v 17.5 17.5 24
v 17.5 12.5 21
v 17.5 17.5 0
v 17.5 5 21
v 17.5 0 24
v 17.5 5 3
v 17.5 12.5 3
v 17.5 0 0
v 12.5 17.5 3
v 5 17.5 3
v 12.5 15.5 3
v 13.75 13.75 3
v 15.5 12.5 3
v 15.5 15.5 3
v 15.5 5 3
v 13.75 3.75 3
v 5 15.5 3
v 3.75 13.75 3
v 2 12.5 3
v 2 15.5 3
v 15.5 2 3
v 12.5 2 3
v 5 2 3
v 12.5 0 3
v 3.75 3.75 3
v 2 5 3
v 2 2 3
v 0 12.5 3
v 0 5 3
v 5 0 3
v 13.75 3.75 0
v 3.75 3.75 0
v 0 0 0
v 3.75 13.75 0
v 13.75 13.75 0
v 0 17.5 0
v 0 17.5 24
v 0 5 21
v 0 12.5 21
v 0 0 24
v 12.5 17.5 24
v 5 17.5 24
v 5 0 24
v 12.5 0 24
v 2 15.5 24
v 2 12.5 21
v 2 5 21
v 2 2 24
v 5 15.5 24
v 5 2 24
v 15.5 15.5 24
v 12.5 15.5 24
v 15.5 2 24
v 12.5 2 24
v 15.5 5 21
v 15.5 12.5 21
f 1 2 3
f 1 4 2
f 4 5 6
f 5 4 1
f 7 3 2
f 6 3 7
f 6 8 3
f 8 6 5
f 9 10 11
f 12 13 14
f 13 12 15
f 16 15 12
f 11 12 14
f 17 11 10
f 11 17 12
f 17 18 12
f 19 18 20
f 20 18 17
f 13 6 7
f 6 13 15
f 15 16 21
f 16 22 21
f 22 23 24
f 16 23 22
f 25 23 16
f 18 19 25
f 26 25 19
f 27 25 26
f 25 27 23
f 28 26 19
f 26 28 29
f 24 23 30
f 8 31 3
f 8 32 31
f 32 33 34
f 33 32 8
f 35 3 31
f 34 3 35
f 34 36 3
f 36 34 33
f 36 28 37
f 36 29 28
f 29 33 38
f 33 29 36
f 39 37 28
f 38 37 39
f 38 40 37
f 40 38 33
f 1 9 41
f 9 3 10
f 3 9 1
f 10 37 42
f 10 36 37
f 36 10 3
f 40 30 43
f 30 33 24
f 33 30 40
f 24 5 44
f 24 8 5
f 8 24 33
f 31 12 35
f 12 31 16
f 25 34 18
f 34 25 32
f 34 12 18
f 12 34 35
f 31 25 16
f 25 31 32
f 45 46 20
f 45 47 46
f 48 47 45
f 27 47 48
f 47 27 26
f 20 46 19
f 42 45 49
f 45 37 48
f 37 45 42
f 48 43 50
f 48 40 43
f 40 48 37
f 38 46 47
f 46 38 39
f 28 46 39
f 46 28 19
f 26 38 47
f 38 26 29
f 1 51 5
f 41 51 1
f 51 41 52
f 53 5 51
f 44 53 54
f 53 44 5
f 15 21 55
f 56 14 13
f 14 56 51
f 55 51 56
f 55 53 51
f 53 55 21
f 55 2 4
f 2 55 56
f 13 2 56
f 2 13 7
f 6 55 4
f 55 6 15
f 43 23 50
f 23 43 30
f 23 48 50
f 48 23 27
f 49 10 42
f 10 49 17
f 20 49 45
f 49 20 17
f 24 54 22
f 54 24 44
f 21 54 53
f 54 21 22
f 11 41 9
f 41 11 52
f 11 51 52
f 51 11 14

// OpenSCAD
// Cuvette Holder
// 8/19/15
// Justin Chew
// Rust Lab
// measurements are in mm

//cuvette_width = 12;
//cuvette_height = 45;

// Length (number of holders)
long = 1;
// Width (number of holders)
wide = 1;
support_height = 24*1;
support_length = 5*1;
support_thick = 2*1;
base_inner_hole = 10*1;
base_int_hole = 13.5*1;
base_ext = base_int_hole+2*support_thick;
base_thick = 3*1;

for (i = [0:long-1]) {
for (j = [0:wide-1]) {

translate([i*(base_ext-support_thick),j*(base_ext-support_thick),0]) {

// base of support
difference() {
    
    cube([base_ext, base_ext, base_thick]);
    
    translate([(base_ext-base_inner_hole)/2, (base_ext-base_inner_hole)/2, 0]) {
        cube([base_inner_hole, base_inner_hole, base_thick]);
    }

}

// side wall supports
for (k = [0:1]) {
translate([k*(base_ext-support_thick),0,0]) {
difference() {
cube([support_thick, base_ext, support_height]);
translate([0, support_length, base_thick]) {
cube([support_thick, base_ext-2*support_length, support_height-2*base_thick]);
}
}
}
}
// start four-corner supports
// bottom left corner
cube([support_length, support_thick, support_height]);
// top left corner
translate([0, base_ext-support_thick, 0]) {
    cube([support_length, support_thick, support_height]);
}
// bottom right corner
translate([base_ext-support_length, 0, 0]) {
    cube([support_length, support_thick, support_height]);
}
// top right corner
translate([base_ext-support_length, base_ext-support_thick, 0]) {
    cube([support_length, support_thick, support_height]);
}


} // end translate

} // end for y
} // end for x
